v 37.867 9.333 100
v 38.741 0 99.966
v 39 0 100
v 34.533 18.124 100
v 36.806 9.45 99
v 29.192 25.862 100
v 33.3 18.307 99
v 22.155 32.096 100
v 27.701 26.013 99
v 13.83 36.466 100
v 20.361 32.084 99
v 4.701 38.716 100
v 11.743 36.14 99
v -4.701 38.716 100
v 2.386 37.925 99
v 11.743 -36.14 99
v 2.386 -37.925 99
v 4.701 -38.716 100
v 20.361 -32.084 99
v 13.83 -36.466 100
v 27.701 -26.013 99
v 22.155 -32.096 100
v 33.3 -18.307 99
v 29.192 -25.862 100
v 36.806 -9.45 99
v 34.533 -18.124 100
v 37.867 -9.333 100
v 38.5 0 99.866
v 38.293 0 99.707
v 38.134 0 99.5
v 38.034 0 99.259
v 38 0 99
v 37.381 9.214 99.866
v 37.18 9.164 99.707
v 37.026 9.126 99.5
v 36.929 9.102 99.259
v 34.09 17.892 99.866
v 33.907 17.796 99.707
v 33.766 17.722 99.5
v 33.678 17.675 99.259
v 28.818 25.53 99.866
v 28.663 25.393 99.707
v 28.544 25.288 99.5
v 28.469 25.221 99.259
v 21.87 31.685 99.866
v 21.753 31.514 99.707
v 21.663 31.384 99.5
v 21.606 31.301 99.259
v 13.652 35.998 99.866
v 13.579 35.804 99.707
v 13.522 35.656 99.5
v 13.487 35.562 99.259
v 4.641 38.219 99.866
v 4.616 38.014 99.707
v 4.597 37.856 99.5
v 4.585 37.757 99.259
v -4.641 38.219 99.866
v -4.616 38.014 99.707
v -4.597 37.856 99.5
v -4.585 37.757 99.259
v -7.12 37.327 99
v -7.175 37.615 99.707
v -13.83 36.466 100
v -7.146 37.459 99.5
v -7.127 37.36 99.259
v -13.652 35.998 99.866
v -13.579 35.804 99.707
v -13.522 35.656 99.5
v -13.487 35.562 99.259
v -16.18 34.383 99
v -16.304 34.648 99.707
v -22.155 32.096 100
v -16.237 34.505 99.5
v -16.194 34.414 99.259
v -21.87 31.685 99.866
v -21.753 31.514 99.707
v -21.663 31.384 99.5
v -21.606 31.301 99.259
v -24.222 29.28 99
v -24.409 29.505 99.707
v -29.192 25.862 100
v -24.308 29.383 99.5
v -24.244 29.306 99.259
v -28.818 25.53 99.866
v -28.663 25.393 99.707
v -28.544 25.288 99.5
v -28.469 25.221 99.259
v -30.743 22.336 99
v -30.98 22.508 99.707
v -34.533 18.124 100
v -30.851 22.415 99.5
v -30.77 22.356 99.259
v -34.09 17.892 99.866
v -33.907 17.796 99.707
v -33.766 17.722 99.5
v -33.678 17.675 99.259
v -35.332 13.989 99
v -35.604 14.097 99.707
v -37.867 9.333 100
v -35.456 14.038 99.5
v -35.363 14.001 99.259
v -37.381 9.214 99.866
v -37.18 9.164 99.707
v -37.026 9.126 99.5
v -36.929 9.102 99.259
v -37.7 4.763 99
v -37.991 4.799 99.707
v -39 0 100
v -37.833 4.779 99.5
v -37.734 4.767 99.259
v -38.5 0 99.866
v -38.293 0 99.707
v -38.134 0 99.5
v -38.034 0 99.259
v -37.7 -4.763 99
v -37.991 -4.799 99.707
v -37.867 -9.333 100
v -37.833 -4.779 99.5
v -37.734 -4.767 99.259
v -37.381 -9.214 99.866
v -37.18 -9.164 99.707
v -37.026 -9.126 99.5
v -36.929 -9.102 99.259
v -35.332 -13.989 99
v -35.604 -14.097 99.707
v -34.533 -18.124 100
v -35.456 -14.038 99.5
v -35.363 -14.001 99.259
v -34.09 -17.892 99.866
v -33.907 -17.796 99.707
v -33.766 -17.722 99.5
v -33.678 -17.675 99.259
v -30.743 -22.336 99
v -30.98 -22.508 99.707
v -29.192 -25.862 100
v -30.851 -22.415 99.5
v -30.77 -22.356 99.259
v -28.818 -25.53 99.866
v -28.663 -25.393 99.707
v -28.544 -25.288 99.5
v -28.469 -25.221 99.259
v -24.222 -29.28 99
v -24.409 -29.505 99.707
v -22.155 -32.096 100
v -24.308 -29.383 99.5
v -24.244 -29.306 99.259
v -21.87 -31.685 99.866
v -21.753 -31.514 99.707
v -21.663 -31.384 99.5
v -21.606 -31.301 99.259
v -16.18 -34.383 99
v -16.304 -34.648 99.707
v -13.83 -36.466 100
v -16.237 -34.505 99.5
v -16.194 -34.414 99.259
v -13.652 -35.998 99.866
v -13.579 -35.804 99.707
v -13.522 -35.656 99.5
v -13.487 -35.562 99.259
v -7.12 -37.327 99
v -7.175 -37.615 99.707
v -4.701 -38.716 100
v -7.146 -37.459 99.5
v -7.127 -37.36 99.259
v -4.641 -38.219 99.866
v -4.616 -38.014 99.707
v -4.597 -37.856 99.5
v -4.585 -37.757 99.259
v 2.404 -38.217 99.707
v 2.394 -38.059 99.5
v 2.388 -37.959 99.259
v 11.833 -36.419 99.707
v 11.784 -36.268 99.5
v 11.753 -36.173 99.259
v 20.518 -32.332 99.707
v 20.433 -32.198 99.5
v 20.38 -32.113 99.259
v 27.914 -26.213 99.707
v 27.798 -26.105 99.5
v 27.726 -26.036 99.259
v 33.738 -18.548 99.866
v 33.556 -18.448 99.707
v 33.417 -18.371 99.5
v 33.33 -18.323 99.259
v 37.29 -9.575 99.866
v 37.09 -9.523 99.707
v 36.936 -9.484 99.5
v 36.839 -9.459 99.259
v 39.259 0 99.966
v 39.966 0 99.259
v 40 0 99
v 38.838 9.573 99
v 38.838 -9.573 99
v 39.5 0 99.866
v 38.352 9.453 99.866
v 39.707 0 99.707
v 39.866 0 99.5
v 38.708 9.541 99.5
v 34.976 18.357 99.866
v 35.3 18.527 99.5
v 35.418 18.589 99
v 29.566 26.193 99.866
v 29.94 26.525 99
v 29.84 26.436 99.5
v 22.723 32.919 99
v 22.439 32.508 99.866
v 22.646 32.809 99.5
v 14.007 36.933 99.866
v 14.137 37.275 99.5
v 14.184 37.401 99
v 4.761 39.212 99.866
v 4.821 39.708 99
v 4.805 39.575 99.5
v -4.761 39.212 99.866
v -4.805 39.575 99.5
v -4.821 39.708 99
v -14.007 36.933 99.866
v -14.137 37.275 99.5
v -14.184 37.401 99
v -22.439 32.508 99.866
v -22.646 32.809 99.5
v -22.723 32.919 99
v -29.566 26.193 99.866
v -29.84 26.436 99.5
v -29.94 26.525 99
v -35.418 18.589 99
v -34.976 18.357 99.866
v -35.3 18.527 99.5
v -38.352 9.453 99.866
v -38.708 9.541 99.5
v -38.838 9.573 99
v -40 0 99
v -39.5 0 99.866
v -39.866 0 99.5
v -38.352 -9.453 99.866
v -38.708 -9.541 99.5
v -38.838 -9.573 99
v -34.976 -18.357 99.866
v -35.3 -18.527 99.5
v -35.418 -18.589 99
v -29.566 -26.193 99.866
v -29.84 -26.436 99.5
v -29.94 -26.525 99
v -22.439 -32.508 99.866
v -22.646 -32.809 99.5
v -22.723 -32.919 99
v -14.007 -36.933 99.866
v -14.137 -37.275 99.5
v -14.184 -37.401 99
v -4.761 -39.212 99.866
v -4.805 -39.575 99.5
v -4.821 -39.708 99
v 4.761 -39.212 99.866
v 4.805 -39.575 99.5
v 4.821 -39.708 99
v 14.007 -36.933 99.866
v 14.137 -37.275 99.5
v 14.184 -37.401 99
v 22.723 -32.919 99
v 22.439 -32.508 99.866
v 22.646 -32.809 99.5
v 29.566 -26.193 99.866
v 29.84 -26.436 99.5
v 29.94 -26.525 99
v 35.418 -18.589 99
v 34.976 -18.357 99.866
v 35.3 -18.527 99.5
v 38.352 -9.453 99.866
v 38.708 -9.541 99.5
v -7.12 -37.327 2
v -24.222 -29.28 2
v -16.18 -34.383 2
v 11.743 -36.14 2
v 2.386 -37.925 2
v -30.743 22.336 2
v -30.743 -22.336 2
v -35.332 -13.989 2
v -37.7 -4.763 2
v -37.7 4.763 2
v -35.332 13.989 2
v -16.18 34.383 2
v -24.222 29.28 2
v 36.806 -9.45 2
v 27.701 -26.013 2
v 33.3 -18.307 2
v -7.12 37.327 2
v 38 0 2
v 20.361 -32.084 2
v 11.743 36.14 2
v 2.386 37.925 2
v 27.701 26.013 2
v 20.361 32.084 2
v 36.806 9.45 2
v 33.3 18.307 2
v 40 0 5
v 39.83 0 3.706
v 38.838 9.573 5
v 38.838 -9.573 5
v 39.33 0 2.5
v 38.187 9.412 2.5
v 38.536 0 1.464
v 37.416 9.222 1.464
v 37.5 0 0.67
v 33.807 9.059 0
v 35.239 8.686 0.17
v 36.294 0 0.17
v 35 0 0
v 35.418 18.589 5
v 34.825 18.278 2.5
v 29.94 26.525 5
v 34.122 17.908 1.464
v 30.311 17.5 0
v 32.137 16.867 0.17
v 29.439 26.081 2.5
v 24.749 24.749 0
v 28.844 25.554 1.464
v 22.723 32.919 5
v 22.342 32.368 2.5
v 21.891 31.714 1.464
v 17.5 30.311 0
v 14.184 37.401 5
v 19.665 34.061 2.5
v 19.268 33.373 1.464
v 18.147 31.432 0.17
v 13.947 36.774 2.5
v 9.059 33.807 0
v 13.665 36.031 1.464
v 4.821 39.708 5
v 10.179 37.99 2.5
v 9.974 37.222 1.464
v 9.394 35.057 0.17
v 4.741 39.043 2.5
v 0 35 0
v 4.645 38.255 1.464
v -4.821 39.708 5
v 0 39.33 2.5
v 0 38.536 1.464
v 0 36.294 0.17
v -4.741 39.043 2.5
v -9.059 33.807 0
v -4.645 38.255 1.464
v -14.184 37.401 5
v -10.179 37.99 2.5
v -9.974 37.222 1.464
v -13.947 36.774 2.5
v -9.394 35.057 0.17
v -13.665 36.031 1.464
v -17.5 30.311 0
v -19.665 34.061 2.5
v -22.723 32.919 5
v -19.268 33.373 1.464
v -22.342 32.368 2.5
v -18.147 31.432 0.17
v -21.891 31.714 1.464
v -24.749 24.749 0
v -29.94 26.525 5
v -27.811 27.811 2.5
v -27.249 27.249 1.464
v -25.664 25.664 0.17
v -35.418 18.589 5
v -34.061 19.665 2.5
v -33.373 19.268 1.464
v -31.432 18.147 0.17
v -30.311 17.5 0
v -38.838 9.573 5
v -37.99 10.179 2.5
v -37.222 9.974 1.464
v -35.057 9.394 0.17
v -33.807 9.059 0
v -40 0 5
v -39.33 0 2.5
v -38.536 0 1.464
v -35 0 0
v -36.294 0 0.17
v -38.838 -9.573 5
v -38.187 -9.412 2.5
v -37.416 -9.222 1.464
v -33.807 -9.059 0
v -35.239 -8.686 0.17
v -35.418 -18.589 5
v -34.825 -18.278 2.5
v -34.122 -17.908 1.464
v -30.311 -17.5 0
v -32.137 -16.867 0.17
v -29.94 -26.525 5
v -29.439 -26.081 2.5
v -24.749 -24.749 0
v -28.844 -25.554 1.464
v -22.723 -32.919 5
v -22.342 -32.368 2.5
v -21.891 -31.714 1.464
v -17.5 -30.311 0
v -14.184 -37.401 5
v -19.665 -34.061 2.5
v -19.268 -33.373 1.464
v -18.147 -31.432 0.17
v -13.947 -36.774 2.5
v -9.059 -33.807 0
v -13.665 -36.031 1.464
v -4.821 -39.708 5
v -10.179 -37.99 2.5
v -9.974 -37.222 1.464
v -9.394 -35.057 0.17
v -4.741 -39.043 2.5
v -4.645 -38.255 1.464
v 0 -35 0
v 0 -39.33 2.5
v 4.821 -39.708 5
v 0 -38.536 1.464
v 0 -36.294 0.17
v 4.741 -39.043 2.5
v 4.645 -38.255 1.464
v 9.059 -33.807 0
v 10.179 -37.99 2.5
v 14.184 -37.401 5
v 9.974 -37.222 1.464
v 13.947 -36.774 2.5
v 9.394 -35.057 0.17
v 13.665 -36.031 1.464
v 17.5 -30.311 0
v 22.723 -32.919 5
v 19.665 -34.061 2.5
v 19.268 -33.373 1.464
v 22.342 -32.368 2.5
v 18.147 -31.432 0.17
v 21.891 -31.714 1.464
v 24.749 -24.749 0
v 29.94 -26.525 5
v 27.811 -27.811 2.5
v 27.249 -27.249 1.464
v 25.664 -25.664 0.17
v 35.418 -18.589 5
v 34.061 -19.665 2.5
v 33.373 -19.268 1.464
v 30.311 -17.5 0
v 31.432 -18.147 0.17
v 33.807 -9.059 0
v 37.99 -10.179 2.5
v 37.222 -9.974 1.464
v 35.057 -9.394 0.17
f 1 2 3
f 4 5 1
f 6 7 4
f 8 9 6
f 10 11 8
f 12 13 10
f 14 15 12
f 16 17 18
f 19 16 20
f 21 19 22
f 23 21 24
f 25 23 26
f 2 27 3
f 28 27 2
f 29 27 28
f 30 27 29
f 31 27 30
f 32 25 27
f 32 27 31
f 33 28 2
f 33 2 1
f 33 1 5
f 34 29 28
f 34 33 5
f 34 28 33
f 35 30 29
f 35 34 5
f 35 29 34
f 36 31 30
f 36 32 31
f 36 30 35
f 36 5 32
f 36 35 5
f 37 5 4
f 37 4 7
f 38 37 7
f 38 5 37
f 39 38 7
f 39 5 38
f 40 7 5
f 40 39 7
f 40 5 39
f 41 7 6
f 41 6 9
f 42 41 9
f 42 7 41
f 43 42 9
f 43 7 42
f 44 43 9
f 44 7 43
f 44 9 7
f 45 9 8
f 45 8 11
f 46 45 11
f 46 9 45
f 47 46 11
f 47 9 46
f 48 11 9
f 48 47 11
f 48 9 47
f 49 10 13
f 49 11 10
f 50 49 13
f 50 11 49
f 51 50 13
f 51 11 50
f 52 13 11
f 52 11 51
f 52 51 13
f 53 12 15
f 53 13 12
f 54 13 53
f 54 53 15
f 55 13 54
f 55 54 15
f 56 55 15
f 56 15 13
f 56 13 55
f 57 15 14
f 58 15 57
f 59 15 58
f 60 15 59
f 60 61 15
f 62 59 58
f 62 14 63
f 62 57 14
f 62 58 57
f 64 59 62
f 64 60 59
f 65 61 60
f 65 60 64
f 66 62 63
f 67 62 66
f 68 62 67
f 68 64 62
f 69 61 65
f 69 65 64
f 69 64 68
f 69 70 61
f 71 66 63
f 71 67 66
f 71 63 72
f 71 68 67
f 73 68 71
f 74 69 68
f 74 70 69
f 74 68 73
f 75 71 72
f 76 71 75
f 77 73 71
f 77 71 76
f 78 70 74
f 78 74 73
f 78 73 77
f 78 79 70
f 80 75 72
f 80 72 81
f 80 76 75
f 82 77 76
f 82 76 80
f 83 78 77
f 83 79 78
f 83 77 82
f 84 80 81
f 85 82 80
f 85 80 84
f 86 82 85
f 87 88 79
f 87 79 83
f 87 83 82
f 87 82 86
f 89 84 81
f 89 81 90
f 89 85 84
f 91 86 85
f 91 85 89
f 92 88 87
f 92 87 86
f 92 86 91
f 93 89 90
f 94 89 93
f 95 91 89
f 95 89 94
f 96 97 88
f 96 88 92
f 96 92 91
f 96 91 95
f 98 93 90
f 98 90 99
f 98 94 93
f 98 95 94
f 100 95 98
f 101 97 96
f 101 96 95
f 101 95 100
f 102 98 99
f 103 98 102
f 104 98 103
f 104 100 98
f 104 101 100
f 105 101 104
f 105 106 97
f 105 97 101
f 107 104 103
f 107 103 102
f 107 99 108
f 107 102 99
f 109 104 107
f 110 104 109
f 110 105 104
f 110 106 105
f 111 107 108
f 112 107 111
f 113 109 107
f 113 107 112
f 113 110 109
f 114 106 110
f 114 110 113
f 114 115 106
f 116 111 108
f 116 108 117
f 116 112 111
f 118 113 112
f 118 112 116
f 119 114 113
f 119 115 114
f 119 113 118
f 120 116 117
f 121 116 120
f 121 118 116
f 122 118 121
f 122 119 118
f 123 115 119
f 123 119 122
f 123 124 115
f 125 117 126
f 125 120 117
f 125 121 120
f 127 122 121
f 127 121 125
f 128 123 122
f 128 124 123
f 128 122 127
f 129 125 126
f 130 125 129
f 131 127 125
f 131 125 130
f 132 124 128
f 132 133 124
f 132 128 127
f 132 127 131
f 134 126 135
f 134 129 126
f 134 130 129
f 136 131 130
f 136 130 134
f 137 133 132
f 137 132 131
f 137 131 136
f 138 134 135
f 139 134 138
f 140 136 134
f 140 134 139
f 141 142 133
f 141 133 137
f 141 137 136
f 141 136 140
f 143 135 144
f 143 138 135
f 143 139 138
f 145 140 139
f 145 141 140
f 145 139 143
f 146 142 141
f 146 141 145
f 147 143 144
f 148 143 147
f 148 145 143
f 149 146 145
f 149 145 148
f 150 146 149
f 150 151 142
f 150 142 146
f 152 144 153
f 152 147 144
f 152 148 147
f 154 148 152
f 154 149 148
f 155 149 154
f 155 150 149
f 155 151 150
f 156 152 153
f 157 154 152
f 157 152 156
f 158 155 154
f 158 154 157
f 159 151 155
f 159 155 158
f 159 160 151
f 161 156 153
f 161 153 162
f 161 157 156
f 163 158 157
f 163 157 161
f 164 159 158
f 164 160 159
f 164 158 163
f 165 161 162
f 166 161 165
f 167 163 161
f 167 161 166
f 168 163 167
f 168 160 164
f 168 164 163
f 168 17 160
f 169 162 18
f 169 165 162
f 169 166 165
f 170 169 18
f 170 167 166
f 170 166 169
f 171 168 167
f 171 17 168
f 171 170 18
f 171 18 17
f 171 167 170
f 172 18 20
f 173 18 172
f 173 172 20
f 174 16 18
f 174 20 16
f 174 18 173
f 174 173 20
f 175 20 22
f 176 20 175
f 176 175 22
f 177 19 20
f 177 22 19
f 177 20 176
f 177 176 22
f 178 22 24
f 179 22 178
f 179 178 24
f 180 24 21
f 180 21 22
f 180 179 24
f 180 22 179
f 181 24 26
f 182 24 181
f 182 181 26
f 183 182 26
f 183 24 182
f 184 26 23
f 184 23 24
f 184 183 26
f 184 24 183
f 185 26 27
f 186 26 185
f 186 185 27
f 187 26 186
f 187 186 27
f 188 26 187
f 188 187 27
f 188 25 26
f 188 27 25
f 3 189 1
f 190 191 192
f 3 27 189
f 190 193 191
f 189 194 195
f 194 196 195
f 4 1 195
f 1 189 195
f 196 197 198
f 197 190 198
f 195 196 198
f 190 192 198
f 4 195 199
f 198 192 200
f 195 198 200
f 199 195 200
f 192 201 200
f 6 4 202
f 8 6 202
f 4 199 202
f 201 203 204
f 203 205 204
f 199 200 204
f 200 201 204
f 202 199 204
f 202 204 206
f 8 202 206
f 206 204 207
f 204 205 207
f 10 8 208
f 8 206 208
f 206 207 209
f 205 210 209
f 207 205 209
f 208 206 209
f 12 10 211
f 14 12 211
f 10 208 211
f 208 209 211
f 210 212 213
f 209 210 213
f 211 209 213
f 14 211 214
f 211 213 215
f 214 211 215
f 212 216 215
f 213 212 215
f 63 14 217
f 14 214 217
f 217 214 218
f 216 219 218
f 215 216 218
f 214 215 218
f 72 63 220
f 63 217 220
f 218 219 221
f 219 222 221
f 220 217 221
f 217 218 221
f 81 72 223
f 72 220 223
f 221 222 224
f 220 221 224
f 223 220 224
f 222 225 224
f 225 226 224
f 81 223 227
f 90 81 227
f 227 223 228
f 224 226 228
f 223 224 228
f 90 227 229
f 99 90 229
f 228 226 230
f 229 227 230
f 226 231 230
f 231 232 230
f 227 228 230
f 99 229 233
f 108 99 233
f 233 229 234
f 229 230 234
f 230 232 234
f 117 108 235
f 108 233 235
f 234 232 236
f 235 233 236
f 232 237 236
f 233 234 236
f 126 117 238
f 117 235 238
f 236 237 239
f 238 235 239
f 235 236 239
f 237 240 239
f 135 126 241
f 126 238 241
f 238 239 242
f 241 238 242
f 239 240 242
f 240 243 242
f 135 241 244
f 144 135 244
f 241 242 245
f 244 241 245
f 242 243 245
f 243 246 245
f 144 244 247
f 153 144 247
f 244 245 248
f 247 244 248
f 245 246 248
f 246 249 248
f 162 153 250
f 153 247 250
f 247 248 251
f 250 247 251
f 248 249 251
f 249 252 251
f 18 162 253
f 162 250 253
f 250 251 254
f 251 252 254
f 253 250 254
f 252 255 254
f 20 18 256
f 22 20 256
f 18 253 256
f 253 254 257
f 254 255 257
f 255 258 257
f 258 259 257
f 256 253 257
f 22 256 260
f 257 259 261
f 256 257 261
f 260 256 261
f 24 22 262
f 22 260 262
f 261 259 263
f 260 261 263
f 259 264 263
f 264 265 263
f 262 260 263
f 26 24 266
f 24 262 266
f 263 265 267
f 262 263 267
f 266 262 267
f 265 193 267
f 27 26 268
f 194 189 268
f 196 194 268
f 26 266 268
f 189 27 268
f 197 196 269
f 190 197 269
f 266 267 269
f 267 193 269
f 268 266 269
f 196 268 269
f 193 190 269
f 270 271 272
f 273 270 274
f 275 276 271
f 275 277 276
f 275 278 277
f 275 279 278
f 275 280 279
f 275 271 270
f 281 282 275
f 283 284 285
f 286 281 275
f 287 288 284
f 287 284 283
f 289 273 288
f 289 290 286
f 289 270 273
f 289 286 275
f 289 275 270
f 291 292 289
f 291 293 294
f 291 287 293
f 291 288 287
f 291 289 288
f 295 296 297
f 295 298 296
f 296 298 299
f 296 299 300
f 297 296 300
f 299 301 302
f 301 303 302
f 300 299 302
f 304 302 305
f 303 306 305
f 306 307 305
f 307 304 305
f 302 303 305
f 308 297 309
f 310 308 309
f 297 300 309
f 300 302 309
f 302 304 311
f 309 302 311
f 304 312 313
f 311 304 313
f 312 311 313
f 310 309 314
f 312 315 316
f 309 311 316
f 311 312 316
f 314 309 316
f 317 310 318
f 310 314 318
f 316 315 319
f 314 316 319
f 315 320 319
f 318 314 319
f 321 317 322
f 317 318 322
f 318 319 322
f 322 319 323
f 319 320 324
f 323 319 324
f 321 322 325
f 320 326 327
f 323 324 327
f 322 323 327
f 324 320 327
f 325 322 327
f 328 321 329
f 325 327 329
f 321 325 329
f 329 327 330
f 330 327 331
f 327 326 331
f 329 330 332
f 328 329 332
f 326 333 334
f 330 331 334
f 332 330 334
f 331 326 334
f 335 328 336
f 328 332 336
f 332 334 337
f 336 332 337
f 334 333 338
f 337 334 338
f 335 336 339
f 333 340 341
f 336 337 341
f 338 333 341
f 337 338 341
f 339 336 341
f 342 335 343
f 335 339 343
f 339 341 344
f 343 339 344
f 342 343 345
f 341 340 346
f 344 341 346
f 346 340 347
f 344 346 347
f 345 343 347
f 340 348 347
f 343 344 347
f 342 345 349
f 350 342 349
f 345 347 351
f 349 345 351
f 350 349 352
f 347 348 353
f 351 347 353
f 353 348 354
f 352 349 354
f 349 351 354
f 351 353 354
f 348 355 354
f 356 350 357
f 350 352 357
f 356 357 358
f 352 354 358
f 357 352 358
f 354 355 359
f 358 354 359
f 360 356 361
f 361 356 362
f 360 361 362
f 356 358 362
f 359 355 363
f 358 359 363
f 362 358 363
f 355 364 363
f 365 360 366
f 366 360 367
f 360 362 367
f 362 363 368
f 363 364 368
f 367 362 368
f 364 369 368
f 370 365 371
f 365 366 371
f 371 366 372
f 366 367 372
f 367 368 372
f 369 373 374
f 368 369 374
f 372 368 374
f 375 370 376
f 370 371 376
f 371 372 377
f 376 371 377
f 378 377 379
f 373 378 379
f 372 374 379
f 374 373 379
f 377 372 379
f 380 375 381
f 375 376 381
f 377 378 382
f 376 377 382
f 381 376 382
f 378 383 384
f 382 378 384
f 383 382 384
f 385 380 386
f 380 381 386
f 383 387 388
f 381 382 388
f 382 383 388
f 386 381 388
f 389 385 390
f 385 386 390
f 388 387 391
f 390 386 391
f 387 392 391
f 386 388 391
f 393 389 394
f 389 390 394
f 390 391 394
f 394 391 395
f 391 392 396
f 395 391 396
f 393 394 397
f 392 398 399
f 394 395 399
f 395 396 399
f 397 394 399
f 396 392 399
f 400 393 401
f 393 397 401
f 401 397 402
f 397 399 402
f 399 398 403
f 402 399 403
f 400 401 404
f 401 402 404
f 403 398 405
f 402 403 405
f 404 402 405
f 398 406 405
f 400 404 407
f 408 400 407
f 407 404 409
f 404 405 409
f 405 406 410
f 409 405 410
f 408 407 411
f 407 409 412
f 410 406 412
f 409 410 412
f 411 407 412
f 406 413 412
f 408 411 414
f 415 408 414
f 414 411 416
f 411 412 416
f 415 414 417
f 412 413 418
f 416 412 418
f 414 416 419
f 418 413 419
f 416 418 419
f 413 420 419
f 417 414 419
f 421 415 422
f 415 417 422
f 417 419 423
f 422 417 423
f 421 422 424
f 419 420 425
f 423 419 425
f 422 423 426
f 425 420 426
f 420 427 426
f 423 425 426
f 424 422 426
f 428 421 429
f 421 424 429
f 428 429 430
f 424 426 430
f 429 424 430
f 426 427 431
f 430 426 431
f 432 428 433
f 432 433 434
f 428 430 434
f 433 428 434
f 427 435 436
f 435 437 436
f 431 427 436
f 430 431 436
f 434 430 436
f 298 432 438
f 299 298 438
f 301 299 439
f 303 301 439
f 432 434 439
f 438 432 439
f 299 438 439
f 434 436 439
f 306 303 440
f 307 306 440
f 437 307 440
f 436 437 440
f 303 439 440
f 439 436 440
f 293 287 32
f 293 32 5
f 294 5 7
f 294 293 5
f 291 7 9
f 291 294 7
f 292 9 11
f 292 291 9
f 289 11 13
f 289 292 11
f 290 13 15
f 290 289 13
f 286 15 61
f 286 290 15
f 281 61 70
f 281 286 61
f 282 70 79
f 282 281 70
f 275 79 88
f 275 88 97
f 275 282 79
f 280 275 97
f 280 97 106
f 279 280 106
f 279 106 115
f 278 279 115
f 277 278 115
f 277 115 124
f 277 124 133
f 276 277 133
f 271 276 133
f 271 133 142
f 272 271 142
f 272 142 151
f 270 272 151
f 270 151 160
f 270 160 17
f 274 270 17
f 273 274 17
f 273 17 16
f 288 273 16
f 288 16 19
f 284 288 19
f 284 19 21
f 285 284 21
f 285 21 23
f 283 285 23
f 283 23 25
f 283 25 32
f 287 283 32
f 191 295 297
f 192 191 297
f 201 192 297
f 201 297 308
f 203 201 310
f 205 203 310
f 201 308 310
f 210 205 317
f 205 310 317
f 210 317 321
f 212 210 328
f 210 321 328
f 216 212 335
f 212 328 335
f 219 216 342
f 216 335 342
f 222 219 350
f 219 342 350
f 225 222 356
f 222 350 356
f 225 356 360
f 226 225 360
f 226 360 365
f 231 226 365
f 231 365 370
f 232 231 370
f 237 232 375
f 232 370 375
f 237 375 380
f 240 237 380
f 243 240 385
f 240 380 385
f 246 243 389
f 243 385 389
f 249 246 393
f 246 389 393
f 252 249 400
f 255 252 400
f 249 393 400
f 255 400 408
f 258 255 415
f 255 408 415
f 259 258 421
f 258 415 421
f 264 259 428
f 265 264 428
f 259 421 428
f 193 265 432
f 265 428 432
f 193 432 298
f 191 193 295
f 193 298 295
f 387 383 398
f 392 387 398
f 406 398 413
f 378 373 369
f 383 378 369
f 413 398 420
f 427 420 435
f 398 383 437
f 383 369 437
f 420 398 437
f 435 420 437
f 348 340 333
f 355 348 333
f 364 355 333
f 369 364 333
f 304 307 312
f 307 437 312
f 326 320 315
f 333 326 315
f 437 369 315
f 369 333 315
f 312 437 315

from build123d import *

# Parameters (mm, degrees)
F0_R     = 40
F1_DEPTH = 100
F2_T     = -2
F3_R     = 1
F4_R     = 0.99999
F5_R     = 5


# Not quite as in the source:
# - a fillet or chamfer is up to 0.001 mm smaller than in the source, because OpenCascade refuses the exact size


with BuildPart() as f1:
    # F0 (on Top) → F1 (new body)
    with BuildSketch(Plane.XY):
        Circle(F0_R)
    extrude(amount=F1_DEPTH)

    # F2
    f2_openings = [f1.faces().sort_by_distance(p)[0] for p in [
        (0, 0, 100),
    ]]
    offset(amount=F2_T, openings=f2_openings)

    # F3
    f3_edges = [f1.edges().sort_by_distance(p)[0] for p in [
        (-38, 0, 100),
    ]]
    fillet(f3_edges, radius=F3_R)

    # F4 (radius 1 in the source; OpenCascade refuses exactly that, so slightly less here)
    f4_edges = [f1.edges().sort_by_distance(p)[0] for p in [
        (-40, 0, 100),
    ]]
    fillet(f4_edges, radius=F4_R)

    # F5
    f5_edges = [f1.edges().sort_by_distance(p)[0] for p in [
        (-40, 0, 0),
    ]]
    fillet(f5_edges, radius=F5_R)


solid = f1.part
